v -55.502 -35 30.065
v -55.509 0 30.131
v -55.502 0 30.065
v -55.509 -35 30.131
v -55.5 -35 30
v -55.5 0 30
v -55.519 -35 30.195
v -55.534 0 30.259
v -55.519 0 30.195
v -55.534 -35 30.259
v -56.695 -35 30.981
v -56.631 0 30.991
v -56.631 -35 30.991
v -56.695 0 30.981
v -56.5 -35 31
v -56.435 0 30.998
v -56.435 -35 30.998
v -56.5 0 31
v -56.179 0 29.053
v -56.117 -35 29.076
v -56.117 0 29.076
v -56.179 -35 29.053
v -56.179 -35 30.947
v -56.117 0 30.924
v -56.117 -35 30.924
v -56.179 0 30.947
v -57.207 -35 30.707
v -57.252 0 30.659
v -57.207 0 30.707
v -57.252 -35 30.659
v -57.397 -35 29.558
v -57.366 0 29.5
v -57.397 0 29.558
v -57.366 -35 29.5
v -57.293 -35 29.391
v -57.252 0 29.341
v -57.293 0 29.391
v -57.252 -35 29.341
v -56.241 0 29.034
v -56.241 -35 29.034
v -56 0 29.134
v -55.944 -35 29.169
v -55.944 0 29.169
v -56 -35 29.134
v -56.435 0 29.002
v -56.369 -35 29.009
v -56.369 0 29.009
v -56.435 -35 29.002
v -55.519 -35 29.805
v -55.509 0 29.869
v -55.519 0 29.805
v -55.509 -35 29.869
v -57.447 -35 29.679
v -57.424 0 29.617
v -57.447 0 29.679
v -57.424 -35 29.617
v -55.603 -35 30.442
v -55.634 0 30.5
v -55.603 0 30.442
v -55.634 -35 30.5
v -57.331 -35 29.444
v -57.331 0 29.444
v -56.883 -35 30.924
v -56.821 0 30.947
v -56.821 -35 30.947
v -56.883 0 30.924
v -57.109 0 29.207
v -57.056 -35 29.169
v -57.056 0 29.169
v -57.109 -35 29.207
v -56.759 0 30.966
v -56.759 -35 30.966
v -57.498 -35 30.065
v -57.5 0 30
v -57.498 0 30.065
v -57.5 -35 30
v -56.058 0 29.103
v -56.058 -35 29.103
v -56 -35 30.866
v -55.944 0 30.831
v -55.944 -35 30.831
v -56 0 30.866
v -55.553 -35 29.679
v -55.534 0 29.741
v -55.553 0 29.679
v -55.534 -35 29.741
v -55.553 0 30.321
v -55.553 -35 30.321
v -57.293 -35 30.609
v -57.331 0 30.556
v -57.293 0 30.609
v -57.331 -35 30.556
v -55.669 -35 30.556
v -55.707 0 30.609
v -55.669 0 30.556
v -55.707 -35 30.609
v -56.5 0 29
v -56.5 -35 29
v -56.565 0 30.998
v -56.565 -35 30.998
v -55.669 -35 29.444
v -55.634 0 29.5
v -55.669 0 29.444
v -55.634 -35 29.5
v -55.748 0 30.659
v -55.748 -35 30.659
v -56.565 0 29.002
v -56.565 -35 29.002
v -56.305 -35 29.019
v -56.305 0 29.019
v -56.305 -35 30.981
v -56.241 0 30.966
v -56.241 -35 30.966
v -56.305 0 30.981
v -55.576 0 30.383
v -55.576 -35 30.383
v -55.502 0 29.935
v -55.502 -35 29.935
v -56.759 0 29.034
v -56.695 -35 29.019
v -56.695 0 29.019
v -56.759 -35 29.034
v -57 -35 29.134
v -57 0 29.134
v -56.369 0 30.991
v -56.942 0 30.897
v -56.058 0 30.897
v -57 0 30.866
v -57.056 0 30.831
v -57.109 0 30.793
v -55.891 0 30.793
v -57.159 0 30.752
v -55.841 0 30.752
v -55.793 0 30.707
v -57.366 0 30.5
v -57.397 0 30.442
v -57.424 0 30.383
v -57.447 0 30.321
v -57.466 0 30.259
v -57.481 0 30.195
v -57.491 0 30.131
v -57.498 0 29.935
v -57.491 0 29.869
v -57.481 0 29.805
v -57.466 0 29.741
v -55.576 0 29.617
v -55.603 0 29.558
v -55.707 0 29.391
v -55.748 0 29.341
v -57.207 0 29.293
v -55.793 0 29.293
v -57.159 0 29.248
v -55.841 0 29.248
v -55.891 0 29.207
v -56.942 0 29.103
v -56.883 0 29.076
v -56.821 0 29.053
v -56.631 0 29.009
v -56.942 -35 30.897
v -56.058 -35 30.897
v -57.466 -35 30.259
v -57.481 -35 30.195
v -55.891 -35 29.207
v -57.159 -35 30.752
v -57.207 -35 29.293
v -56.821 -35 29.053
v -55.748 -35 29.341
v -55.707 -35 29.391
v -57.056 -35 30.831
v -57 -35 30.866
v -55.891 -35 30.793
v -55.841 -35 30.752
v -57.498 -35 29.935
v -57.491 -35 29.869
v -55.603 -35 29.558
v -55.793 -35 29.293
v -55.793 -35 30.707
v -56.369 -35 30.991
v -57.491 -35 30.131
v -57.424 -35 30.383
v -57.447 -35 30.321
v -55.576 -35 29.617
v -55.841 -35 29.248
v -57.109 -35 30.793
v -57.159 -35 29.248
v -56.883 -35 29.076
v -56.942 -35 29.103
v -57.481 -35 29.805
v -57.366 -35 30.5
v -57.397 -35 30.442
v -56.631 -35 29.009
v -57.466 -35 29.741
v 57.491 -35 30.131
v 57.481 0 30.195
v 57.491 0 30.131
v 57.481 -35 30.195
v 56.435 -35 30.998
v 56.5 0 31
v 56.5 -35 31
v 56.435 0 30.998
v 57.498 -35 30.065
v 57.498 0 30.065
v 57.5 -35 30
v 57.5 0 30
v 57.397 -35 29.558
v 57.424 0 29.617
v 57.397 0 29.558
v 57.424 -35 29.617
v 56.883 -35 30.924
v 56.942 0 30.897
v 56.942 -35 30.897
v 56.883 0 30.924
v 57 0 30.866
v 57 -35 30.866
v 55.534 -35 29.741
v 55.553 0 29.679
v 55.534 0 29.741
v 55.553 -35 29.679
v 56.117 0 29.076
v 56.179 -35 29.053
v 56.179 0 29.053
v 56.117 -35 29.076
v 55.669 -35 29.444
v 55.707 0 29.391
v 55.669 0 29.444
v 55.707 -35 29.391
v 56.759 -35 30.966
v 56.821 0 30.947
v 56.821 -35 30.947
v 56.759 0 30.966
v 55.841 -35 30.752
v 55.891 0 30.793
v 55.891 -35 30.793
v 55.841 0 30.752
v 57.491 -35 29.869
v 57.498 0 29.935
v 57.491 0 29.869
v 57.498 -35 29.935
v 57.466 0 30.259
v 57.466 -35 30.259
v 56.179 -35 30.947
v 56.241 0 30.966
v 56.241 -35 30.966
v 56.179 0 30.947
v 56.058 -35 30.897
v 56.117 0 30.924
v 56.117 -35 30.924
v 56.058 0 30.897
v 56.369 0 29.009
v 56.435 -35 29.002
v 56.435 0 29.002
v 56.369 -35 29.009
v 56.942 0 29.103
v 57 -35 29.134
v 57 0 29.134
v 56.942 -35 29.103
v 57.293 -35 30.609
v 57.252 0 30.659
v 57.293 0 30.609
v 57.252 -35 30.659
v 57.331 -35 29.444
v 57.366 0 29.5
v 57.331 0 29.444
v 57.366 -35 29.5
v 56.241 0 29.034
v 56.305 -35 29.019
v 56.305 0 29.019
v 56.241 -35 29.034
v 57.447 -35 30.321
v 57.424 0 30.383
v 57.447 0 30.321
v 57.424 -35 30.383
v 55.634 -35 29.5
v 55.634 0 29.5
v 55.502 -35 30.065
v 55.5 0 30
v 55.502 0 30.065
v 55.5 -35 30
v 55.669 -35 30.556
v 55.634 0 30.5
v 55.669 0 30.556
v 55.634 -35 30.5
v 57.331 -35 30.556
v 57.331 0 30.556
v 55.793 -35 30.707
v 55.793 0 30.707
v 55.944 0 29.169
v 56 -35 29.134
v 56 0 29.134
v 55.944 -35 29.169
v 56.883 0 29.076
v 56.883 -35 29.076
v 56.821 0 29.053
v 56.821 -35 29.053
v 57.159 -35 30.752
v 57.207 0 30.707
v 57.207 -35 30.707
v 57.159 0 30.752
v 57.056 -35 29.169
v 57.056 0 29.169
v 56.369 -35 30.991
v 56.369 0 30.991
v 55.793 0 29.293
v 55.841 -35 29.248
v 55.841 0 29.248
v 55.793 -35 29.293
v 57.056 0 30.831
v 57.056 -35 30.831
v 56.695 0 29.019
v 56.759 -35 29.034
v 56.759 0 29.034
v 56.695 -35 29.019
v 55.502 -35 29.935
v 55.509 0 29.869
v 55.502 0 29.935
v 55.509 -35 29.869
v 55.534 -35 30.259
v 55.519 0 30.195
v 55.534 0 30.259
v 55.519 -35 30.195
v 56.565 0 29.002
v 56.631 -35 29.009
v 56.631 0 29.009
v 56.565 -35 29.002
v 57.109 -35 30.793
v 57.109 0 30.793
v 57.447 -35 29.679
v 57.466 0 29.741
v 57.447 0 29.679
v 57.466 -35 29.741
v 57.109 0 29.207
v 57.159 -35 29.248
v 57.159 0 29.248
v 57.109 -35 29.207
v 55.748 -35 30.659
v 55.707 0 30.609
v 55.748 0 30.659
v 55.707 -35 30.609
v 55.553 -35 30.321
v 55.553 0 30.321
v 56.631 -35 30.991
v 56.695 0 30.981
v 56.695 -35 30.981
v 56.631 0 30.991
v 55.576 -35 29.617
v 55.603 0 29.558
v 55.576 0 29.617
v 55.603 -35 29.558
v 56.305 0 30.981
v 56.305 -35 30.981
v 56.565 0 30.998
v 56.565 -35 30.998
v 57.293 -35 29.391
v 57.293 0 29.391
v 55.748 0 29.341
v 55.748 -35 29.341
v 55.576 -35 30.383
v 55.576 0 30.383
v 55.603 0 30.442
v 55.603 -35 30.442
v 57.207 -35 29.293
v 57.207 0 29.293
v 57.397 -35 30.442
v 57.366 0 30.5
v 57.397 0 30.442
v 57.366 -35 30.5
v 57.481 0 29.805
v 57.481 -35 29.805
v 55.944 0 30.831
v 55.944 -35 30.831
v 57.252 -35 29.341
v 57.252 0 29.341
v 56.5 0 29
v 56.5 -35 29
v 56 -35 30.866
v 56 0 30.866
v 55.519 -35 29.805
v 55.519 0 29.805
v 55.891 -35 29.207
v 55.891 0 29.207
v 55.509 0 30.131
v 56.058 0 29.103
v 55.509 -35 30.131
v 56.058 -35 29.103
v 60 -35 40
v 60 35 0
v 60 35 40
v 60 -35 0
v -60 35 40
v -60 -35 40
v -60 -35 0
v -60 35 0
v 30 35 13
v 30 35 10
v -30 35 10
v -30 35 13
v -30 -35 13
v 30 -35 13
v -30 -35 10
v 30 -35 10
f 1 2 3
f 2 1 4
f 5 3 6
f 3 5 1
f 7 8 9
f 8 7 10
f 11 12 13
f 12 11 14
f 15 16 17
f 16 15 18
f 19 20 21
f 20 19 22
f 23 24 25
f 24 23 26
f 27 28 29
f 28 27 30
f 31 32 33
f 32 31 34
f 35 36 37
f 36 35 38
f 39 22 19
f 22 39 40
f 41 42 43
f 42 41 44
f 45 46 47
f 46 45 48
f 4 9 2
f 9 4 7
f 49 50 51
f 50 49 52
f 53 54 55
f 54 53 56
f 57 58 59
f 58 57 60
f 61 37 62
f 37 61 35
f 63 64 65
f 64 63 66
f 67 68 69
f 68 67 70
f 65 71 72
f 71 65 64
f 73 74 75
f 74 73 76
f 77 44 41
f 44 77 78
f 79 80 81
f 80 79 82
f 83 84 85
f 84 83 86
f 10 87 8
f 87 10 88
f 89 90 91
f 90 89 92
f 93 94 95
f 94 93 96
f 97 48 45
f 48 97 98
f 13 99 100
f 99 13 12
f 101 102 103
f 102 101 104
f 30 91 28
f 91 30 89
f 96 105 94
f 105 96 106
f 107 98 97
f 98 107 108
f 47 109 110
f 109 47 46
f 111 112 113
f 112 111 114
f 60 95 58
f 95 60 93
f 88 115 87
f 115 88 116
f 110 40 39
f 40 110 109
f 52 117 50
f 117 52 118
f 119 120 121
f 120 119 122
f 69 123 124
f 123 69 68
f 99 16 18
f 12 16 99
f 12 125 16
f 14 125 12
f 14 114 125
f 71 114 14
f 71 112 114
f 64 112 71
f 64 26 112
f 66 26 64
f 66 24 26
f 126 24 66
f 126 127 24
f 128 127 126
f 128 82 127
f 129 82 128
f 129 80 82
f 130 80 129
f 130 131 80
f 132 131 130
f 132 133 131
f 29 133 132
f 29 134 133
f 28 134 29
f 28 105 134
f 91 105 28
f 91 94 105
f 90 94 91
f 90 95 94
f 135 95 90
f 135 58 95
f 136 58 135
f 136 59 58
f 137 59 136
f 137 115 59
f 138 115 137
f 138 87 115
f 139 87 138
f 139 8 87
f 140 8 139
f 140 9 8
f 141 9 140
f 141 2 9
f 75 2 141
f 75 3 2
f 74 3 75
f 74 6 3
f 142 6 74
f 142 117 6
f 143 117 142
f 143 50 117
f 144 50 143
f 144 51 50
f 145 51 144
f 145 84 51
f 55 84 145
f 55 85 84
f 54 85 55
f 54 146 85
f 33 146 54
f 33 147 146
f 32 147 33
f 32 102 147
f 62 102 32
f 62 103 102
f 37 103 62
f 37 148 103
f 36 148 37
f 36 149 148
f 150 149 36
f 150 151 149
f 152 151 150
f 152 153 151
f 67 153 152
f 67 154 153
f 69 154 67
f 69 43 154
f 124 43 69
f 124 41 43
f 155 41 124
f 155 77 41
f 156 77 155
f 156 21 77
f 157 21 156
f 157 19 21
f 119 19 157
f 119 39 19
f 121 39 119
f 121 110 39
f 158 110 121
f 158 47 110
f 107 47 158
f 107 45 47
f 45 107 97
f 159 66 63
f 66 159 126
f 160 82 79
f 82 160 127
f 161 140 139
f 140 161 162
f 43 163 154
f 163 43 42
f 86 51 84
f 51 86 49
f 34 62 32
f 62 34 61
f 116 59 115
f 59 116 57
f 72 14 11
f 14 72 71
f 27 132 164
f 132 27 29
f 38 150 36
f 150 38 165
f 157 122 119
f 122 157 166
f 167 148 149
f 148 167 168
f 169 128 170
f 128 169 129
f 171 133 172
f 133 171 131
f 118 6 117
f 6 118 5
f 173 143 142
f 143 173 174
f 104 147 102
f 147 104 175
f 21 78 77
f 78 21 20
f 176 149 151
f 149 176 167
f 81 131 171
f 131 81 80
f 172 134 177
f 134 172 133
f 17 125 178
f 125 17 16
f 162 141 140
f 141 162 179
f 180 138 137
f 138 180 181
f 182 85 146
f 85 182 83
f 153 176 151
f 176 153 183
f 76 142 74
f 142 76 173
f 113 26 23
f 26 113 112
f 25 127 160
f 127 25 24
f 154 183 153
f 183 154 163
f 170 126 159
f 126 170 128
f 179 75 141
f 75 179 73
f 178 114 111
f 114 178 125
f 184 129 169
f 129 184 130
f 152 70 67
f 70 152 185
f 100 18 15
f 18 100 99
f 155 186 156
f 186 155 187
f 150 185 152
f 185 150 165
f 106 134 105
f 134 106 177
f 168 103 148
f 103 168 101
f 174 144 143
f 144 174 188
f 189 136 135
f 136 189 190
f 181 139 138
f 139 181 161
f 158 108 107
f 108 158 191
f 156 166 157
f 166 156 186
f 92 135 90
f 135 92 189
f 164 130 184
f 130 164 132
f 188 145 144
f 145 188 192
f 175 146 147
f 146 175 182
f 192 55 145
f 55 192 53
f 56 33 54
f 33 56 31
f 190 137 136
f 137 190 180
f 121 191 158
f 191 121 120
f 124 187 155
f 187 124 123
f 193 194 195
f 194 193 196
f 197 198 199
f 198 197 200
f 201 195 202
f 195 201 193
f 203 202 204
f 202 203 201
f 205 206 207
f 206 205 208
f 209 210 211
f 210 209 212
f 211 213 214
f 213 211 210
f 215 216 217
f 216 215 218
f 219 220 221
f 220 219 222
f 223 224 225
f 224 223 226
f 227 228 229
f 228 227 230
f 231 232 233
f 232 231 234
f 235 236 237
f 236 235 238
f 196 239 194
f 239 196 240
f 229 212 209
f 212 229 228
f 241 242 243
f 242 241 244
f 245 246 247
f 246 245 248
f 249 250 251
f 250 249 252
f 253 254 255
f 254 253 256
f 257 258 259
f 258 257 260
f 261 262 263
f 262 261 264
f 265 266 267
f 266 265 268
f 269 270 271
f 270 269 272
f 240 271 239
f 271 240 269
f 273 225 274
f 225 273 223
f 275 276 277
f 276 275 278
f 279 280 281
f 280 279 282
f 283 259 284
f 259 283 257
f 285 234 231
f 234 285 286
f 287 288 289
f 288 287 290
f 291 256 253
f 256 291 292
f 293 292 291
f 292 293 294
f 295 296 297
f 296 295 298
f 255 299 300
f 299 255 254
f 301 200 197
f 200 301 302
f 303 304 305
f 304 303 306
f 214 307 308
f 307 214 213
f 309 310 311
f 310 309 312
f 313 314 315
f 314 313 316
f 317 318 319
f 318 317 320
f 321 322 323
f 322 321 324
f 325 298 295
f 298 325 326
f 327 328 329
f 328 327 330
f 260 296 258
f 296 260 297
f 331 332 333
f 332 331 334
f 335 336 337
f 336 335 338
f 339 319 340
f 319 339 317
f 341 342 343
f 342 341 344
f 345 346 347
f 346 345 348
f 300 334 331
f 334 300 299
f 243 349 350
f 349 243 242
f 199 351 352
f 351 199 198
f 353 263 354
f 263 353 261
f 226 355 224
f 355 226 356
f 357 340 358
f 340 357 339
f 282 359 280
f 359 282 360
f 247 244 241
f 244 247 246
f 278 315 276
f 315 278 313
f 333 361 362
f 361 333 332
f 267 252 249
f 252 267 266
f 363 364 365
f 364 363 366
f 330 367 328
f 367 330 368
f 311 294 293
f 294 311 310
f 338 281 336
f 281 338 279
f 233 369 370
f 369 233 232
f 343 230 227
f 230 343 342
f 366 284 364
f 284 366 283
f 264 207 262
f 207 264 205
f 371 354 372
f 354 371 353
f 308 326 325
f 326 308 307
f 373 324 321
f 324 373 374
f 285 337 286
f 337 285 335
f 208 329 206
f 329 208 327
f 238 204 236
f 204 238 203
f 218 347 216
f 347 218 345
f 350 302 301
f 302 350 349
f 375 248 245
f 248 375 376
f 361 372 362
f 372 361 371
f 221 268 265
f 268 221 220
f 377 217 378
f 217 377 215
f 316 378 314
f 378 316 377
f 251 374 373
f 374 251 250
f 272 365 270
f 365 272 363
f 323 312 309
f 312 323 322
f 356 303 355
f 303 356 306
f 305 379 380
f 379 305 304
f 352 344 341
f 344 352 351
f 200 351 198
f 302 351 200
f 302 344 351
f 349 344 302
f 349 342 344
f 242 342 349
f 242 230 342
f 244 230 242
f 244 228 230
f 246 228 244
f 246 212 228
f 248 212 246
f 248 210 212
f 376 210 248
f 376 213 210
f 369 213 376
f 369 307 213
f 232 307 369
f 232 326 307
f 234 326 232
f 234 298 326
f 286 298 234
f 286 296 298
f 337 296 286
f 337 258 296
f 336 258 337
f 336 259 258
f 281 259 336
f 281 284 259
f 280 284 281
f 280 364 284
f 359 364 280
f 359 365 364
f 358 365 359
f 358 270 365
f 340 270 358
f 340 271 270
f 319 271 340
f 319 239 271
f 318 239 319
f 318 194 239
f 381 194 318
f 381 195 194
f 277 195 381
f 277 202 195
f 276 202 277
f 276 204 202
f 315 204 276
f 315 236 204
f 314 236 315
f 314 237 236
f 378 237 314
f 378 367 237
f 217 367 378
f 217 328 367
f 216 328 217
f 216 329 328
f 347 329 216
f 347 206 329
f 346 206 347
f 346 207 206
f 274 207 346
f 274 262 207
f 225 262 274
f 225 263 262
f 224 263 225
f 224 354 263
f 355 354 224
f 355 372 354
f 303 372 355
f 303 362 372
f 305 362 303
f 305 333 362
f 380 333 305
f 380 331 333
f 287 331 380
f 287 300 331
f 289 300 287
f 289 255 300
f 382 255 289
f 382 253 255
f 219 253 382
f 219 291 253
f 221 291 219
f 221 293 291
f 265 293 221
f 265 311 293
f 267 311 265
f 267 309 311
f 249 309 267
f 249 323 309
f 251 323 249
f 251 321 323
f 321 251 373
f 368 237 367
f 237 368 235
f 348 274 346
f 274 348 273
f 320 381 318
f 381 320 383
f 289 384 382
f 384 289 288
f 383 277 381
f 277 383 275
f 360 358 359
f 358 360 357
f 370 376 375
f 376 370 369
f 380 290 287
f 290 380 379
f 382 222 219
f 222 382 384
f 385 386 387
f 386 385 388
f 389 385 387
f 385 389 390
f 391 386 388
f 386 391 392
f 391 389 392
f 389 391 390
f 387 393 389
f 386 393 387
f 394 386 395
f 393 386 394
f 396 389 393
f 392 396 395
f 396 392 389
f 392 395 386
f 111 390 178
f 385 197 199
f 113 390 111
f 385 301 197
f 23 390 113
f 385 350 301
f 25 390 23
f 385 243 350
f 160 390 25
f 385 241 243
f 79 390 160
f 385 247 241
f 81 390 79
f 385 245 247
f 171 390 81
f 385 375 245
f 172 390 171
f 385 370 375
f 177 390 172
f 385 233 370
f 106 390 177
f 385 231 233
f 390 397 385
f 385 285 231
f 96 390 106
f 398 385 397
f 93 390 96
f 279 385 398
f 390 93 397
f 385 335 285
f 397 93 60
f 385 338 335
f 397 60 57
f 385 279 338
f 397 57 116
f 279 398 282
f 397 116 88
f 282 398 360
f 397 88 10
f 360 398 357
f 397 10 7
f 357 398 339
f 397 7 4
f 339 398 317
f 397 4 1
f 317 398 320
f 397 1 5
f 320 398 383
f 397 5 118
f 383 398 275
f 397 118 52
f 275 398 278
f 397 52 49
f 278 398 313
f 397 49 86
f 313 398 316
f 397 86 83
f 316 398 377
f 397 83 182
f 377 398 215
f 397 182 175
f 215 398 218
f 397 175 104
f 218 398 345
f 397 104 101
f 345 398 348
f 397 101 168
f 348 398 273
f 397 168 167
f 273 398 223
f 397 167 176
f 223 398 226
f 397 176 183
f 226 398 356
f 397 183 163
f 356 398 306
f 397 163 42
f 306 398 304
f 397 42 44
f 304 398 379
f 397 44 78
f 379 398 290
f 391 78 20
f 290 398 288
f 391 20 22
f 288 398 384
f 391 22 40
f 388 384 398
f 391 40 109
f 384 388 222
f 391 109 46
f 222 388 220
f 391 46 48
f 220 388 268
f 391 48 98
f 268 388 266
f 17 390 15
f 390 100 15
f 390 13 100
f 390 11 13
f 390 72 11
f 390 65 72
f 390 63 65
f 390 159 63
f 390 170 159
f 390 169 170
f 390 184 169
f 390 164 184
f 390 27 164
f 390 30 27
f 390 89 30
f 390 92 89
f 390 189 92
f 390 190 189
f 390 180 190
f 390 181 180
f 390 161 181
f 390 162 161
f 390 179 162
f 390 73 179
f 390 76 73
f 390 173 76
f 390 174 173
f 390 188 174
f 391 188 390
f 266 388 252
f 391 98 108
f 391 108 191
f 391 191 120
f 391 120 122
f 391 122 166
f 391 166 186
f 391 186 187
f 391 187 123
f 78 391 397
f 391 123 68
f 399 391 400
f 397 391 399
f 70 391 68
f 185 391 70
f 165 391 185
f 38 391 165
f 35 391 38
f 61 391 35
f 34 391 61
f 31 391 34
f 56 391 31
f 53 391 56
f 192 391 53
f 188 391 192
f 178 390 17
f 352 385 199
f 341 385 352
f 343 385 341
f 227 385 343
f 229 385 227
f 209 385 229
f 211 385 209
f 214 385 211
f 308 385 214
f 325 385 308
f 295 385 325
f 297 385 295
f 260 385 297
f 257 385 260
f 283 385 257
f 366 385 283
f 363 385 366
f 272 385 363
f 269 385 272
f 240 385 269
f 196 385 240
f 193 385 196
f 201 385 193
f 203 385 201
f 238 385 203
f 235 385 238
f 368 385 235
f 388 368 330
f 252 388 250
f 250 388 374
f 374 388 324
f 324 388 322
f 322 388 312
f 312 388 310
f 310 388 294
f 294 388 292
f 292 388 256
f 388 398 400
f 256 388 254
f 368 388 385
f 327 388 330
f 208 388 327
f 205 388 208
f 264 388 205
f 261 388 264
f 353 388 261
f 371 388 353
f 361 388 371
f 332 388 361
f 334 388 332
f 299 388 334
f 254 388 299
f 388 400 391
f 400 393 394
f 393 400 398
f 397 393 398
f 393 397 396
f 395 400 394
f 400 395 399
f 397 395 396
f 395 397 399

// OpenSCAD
// Mini horizontal gel-electrophoresis box - buffer tank
// Print orientation: tank base on XY plane, opening upward (+Z)

// ---------------- Parameters ----------------
outer_x      = 120;   // outer length along X (mm)
outer_y      = 70;    // outer width along Y (mm)
outer_h      = 40;    // outer height along Z (mm)

wall         = 3;     // wall thickness (mm)
floor        = 3;     // floor thickness (mm)

platform_x   = 60;    // platform length along X (mm)
platform_z   = 10;    // platform height above inner floor (mm)

hole_d       = 2;     // electrode wire hole diameter (mm)
hole_y       = 0;     // hole centre Y position (mm)
hole_z       = 30;    // hole centre Z position (mm)

eps          = 0.5;   // cutter overshoot past faces (mm)

$fn = 96;

// ---------------- Derived ----------------
inner_x = outer_x - 2 * wall;      // 114 mm
inner_y = outer_y - 2 * wall;      // 64 mm
inner_h = outer_h - floor;         // 37 mm (floor is solid below z = floor)

// ---------------- Model ----------------
difference() {
    // Main tank body (solid block, open top)
    translate([-outer_x / 2, -outer_y / 2, 0])
        cube([outer_x, outer_y, outer_h]);

    // Gel-tray platform, centred in X, spanning full inner width
    translate([-platform_x / 2, -outer_y / 2, floor + platform_z - wall])
        cube([platform_x, outer_y, wall]);   // top at z = floor + platform_z = 13

    // Horizontal electrode holes through each end wall, along X
    for (sx = [-1, 1])
        translate([sx * (inner_x / 2 - eps), hole_y, hole_z])
            rotate([90, 0, 0])
                cylinder(d = hole_d, h = outer_y + 2 * eps);
}
